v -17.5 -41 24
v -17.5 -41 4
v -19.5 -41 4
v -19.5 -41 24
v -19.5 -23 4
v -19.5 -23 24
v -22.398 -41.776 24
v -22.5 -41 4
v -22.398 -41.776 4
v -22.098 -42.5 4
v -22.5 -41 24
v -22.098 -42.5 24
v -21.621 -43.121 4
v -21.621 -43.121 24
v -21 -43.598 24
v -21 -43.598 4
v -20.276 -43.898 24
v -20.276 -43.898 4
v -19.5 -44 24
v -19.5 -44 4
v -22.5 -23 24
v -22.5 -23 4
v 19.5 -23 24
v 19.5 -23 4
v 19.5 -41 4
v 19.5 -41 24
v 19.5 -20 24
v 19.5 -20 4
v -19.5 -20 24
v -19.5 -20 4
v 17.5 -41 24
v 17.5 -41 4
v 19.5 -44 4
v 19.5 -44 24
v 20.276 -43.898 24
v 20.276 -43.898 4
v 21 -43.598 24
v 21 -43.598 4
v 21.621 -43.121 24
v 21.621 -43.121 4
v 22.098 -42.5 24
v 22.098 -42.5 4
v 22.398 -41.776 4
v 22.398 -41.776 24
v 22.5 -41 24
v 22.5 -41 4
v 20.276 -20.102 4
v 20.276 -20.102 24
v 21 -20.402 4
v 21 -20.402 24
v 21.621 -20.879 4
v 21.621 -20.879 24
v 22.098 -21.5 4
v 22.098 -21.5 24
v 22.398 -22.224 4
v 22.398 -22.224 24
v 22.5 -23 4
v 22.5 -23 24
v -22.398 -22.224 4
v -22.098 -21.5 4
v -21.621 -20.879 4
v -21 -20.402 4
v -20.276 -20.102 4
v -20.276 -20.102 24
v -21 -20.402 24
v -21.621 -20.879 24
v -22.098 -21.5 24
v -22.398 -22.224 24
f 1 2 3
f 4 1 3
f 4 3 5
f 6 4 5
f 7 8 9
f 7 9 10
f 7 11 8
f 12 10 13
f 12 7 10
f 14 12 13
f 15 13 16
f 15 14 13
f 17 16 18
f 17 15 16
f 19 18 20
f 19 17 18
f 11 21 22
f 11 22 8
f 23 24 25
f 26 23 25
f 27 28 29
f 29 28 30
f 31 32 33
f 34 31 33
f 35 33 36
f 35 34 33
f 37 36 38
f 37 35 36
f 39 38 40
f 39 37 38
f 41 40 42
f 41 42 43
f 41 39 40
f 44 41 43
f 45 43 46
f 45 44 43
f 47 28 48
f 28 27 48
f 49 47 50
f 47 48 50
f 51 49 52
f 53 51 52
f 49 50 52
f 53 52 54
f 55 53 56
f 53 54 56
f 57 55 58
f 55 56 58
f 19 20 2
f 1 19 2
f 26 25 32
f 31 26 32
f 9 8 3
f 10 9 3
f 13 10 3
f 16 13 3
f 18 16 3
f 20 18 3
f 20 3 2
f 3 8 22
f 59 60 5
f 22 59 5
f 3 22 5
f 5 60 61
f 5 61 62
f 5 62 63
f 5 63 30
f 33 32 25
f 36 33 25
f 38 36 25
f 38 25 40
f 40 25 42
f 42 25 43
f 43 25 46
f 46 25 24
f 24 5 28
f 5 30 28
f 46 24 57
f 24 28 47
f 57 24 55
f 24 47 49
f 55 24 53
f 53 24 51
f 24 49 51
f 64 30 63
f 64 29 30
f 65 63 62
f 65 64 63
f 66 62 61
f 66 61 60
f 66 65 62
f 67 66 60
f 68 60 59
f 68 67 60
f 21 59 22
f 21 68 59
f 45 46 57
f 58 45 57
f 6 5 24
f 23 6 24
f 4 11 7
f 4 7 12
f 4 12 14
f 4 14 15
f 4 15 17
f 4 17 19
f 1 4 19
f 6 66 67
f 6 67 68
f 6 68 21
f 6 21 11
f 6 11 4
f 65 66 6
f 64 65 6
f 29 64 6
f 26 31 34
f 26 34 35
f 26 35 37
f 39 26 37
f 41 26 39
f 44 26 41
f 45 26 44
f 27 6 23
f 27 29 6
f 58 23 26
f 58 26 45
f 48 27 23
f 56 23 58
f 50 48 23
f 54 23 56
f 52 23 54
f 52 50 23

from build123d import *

# Parameters (mm, degrees)
F1_DEPTH = 20
F2_ANGLE = 270
F3_R     = 2.99999


# Not quite as in the source:
# - a fillet or chamfer is up to 0.001 mm smaller than in the source, because OpenCascade refuses the exact size


with BuildPart() as f1:
    # F0 (on Front) → F1 (new body)
    with BuildSketch(Plane.XZ):
        Polygon((22.5, 24), (-22.5, 24), (-22.5, 0), (-19.5, 0), (-17.5, 3), (-19.5, 3), (-19.5, 21), (19.5, 21), (19.5, 3), (17.5, 3), (19.5, 0), (22.5, 0), align=None)
    extrude(amount=F1_DEPTH)


with BuildPart() as f1_1:
    # F2: moved
    add(f1.part.rotate(Axis((0, -20, 24), (1, 0, 0)), F2_ANGLE))

    # F3 (radius 3 in the source; OpenCascade refuses exactly that, so slightly less here)
    f3_edges = [f1_1.edges().sort_by_distance(p)[0] for p in [
        (-22.5, -20, 14),
        (-22.5, -44, 14),
        (22.5, -44, 14),
        (22.5, -20, 14),
    ]]
    fillet(f3_edges, radius=F3_R)


solid = f1_1.part
